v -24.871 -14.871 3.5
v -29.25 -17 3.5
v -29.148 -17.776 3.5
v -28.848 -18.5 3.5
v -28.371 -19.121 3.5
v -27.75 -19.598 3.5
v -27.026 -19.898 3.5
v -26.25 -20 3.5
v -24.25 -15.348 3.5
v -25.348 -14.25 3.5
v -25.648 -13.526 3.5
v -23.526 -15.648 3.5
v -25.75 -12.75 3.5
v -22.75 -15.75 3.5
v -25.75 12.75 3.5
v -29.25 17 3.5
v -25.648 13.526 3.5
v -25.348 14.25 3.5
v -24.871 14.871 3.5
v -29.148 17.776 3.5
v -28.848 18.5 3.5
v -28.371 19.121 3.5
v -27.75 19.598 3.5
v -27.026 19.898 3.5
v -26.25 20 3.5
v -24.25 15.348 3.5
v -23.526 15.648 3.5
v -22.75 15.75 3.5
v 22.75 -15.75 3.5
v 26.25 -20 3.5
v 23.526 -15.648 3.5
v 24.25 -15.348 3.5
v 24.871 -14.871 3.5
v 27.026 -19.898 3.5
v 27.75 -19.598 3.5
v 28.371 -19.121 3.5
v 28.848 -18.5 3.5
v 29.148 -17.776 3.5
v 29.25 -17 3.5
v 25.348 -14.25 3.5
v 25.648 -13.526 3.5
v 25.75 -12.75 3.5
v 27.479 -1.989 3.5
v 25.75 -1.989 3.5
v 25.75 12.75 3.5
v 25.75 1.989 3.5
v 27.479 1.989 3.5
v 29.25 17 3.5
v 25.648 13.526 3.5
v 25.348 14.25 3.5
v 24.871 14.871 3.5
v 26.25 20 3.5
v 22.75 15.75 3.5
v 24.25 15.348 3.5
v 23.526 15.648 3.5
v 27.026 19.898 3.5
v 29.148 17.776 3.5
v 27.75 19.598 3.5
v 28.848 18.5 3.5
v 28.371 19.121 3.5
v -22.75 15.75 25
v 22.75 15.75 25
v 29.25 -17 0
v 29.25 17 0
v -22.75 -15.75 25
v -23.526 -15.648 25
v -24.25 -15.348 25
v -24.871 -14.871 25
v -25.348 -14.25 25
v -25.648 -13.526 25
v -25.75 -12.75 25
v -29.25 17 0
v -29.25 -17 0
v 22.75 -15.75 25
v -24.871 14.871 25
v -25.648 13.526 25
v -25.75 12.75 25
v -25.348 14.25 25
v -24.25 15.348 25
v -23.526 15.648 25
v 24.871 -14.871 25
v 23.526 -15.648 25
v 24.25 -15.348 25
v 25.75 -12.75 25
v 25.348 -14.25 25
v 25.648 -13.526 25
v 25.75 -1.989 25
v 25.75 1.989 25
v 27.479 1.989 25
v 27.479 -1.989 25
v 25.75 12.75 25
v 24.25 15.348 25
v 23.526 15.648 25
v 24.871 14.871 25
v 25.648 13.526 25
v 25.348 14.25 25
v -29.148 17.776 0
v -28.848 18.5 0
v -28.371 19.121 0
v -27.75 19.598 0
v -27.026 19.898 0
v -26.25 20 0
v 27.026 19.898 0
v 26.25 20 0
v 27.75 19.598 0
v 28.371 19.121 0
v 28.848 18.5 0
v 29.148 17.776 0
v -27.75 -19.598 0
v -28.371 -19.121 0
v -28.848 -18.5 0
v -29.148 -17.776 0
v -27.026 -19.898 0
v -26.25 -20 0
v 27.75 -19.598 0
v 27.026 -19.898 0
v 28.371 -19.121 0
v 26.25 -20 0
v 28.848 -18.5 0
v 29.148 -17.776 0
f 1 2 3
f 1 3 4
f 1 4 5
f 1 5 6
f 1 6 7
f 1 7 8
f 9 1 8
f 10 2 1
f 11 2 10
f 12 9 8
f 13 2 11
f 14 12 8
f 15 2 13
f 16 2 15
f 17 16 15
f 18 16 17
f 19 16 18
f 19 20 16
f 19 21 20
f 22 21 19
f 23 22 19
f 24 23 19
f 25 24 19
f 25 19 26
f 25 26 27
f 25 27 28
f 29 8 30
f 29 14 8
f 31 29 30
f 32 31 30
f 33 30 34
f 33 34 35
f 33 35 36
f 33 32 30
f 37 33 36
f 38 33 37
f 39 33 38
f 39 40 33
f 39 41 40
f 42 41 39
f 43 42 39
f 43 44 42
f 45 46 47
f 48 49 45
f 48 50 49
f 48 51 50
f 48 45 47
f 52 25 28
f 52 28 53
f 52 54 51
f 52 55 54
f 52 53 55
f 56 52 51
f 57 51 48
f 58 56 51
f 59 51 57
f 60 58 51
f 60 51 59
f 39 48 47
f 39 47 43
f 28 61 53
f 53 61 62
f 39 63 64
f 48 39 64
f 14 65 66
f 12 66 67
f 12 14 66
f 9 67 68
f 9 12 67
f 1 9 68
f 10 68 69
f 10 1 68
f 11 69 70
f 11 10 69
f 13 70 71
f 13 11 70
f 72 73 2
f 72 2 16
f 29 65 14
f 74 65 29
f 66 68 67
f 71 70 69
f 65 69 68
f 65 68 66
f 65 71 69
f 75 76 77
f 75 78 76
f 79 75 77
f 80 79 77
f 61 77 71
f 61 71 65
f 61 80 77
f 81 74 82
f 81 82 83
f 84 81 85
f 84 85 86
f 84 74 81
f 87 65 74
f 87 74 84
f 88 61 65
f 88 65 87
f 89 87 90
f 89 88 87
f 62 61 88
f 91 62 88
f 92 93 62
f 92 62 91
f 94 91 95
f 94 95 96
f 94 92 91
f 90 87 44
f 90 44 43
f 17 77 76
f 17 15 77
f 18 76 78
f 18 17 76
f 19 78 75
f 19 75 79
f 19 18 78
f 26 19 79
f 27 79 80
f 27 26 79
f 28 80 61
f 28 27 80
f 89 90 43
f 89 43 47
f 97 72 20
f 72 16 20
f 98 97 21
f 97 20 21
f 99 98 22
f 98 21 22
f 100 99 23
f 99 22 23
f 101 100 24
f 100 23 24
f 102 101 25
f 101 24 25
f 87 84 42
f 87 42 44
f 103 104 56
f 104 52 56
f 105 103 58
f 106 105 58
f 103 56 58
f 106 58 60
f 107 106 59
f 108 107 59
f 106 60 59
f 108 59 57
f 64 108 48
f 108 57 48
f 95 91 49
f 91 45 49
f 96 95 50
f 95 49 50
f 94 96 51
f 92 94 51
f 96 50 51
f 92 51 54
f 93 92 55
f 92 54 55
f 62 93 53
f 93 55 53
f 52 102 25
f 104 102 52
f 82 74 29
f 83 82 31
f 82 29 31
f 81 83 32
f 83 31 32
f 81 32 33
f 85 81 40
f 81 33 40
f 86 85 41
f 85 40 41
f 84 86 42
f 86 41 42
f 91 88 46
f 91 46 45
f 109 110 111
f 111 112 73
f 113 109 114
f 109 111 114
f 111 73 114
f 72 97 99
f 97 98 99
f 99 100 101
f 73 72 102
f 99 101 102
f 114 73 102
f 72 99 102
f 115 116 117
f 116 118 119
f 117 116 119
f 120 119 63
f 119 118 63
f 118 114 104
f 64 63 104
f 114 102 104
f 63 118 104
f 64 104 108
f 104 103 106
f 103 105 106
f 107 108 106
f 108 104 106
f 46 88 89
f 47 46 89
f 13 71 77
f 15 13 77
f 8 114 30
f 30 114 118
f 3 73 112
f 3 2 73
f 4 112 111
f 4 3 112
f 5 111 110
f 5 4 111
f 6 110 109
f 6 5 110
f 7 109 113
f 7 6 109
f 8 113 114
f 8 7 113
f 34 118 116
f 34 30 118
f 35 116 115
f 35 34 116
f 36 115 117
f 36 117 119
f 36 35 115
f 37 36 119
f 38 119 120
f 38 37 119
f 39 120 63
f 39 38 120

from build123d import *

# Parameters (mm, degrees)
SKETCH_1_W           = 58.5
SKETCH_1_H           = 40
EXTRUDE_1_DEPTH      = 25
SKETCH_2_OUTSIDE_W   = 75.53
SKETCH_2_OUTSIDE_H   = 57.03
SKETCH_2_OUTSIDE_W_2 = 51.5
SKETCH_2_OUTSIDE_H_2 = 31.5
CUT_EXTRUDE_4_DEPTH  = 21.5
EXTRUDE_2_REACH      = 45.365
SKETCH_3_W           = 3.457860742
SKETCH_3_H           = 3.97738732
FILLET_1_R           = 3
FILLET_2_R           = 3
FILLET_3_R           = 3


with BuildPart() as part:
    # 草图1 → 凸台-拉伸1 (new body)
    with BuildSketch(Plane.XY):
        Rectangle(SKETCH_1_W, SKETCH_1_H)
    extrude(amount=EXTRUDE_1_DEPTH)

    # 草图2 outside → 切除-拉伸4 (cut)
    with BuildSketch(Plane.XY.offset(25)):
        Rectangle(SKETCH_2_OUTSIDE_W, SKETCH_2_OUTSIDE_H)
        Rectangle(SKETCH_2_OUTSIDE_W_2, SKETCH_2_OUTSIDE_H_2, mode=Mode.SUBTRACT)
    extrude(amount=-CUT_EXTRUDE_4_DEPTH, mode=Mode.SUBTRACT)

    # 草图3 → 凸台-拉伸2 (add, up to next)
    with BuildSketch(Plane.XY.offset(25), mode=Mode.PRIVATE) as extrude_2_sk1:
        with Locations((25.75, 0)):
            Rectangle(SKETCH_3_W, SKETCH_3_H)
    extrude_2_tool1 = extrude(extrude_2_sk1.sketch, amount=-EXTRUDE_2_REACH, mode=Mode.PRIVATE) - part.part
    add(extrude_2_tool1.solids().sort_by_distance((25.75, 0, 25))[0])

    # 圆角1
    fillet_1_edges = [part.edges().sort_by_distance(p)[0] for p in [
        (25.75, -15.75, 14.25),
        (25.75, 15.75, 14.25),
    ]]
    fillet(fillet_1_edges, radius=FILLET_1_R)

    # 圆角2
    fillet_2_edges = [part.edges().sort_by_distance(p)[0] for p in [
        (-25.75, -15.75, 14.25),
        (-25.75, 15.75, 14.25),
    ]]
    fillet(fillet_2_edges, radius=FILLET_2_R)

    # 圆角3
    fillet_3_edges = [part.edges().sort_by_distance(p)[0] for p in [
        (29.25, -20, 1.75),
        (-29.25, -20, 1.75),
        (-29.25, 20, 1.75),
        (29.25, 20, 1.75),
    ]]
    fillet(fillet_3_edges, radius=FILLET_3_R)


solid = part.part
